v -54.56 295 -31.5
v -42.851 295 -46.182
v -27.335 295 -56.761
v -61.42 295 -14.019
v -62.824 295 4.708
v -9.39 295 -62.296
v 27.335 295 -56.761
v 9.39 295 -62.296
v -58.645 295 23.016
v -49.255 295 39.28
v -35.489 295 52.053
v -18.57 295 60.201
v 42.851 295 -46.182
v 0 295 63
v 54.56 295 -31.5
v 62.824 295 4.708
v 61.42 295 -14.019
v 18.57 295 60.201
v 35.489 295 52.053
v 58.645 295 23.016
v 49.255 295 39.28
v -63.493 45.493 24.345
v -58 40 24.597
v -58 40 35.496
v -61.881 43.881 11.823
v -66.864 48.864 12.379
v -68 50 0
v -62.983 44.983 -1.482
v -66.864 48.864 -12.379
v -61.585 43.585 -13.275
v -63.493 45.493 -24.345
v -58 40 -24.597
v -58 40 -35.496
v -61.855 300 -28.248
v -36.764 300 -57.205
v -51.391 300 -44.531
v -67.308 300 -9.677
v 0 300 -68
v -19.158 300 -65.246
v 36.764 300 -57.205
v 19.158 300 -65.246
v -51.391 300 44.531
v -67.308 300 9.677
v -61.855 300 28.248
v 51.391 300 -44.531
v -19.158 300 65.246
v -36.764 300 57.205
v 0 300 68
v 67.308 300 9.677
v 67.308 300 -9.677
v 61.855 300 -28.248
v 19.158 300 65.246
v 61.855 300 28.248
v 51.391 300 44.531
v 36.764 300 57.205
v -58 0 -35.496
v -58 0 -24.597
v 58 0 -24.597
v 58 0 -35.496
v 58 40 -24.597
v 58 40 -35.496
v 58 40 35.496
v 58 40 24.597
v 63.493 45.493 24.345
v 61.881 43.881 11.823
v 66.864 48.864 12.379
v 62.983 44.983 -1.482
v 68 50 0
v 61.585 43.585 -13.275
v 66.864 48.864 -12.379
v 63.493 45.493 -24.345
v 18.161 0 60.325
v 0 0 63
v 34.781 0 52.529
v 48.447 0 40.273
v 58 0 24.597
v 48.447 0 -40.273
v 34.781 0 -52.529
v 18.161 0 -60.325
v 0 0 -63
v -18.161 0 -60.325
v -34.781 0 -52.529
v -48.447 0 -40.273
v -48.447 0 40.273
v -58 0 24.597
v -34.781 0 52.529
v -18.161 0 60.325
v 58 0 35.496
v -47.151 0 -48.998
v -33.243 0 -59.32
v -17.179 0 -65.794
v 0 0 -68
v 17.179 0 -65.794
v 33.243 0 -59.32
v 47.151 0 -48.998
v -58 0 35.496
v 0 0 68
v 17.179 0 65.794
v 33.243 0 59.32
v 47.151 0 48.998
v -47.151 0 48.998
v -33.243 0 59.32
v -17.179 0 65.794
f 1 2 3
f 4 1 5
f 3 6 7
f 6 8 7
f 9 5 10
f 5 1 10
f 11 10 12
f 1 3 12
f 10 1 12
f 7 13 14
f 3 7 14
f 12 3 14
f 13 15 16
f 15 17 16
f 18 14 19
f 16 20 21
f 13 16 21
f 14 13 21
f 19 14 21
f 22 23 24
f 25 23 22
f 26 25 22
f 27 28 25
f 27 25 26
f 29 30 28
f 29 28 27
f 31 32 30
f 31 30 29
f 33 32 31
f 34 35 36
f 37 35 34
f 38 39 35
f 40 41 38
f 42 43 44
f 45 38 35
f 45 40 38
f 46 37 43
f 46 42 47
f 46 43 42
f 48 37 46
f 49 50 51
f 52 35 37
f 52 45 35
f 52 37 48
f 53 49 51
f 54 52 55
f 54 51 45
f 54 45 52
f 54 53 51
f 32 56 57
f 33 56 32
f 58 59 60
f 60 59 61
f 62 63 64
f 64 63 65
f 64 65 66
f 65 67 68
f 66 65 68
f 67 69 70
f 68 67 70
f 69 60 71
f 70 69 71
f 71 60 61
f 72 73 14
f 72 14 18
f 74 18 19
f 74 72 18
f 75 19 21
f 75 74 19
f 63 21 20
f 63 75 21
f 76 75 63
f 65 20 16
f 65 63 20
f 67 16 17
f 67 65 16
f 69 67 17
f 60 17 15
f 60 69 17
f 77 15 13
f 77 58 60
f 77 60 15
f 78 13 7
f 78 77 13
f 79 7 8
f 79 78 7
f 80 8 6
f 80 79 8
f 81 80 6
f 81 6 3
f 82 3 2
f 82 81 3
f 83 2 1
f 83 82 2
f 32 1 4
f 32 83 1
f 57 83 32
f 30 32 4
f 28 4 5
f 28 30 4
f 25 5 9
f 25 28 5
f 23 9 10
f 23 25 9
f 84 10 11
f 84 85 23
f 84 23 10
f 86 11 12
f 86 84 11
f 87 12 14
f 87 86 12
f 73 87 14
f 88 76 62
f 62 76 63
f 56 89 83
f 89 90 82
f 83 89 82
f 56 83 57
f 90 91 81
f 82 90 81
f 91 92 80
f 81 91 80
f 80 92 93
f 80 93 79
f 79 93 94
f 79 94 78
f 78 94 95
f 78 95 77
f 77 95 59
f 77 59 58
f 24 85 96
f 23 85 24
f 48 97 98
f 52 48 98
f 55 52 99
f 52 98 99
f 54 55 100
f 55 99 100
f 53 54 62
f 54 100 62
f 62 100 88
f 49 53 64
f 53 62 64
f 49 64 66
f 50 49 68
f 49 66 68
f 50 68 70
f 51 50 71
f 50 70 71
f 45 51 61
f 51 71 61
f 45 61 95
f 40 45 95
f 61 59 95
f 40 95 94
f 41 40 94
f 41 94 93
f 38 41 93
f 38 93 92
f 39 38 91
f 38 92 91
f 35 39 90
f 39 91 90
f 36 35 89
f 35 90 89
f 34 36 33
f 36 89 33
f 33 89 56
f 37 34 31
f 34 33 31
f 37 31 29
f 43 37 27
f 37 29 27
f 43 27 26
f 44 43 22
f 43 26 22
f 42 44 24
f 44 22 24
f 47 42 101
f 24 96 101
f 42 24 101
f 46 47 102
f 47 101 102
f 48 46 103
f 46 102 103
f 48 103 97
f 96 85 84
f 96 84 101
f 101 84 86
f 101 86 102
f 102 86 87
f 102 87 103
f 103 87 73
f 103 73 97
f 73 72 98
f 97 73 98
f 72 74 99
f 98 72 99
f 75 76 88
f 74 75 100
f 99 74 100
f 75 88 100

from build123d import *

# Parameters (mm, degrees)
SKETCH3_R               = 68
BOSS_EXTRUDE1_DEPTH     = 300
SHELL1_T                = -5
CUT_EXTRUDE3_DEPTH      = 316.036505821
CUT_EXTRUDE3_DEPTH_BACK = 316.036505821


with BuildPart() as part:
    # Sketch3 → Boss-Extrude1 (new body)
    with BuildSketch(Plane(origin=(0, 0, 0), x_dir=(1, 0, 0), z_dir=(0, 1, 0))):
        Circle(SKETCH3_R)
    extrude(amount=BOSS_EXTRUDE1_DEPTH)

    # Shell1
    shell1_openings = [part.faces().sort_by_distance(p)[0] for p in [
        (0, 0, 0),
    ]]
    offset(amount=SHELL1_T, openings=shell1_openings, kind=Kind.INTERSECTION)

    # Sketch8 → Cut-Extrude3 (cut, two sides: drawn at the far end of the back side and taken through both)
    with BuildSketch(Plane.XY.offset(-CUT_EXTRUDE3_DEPTH_BACK)):
        Polygon((-68, 0), (-58, 0), (-58, 40), (-68, 50), align=None)
        Polygon((68, 0), (58, 0), (58, 40), (68, 50), align=None)
    extrude(amount=CUT_EXTRUDE3_DEPTH + CUT_EXTRUDE3_DEPTH_BACK, mode=Mode.SUBTRACT)


solid = part.part
